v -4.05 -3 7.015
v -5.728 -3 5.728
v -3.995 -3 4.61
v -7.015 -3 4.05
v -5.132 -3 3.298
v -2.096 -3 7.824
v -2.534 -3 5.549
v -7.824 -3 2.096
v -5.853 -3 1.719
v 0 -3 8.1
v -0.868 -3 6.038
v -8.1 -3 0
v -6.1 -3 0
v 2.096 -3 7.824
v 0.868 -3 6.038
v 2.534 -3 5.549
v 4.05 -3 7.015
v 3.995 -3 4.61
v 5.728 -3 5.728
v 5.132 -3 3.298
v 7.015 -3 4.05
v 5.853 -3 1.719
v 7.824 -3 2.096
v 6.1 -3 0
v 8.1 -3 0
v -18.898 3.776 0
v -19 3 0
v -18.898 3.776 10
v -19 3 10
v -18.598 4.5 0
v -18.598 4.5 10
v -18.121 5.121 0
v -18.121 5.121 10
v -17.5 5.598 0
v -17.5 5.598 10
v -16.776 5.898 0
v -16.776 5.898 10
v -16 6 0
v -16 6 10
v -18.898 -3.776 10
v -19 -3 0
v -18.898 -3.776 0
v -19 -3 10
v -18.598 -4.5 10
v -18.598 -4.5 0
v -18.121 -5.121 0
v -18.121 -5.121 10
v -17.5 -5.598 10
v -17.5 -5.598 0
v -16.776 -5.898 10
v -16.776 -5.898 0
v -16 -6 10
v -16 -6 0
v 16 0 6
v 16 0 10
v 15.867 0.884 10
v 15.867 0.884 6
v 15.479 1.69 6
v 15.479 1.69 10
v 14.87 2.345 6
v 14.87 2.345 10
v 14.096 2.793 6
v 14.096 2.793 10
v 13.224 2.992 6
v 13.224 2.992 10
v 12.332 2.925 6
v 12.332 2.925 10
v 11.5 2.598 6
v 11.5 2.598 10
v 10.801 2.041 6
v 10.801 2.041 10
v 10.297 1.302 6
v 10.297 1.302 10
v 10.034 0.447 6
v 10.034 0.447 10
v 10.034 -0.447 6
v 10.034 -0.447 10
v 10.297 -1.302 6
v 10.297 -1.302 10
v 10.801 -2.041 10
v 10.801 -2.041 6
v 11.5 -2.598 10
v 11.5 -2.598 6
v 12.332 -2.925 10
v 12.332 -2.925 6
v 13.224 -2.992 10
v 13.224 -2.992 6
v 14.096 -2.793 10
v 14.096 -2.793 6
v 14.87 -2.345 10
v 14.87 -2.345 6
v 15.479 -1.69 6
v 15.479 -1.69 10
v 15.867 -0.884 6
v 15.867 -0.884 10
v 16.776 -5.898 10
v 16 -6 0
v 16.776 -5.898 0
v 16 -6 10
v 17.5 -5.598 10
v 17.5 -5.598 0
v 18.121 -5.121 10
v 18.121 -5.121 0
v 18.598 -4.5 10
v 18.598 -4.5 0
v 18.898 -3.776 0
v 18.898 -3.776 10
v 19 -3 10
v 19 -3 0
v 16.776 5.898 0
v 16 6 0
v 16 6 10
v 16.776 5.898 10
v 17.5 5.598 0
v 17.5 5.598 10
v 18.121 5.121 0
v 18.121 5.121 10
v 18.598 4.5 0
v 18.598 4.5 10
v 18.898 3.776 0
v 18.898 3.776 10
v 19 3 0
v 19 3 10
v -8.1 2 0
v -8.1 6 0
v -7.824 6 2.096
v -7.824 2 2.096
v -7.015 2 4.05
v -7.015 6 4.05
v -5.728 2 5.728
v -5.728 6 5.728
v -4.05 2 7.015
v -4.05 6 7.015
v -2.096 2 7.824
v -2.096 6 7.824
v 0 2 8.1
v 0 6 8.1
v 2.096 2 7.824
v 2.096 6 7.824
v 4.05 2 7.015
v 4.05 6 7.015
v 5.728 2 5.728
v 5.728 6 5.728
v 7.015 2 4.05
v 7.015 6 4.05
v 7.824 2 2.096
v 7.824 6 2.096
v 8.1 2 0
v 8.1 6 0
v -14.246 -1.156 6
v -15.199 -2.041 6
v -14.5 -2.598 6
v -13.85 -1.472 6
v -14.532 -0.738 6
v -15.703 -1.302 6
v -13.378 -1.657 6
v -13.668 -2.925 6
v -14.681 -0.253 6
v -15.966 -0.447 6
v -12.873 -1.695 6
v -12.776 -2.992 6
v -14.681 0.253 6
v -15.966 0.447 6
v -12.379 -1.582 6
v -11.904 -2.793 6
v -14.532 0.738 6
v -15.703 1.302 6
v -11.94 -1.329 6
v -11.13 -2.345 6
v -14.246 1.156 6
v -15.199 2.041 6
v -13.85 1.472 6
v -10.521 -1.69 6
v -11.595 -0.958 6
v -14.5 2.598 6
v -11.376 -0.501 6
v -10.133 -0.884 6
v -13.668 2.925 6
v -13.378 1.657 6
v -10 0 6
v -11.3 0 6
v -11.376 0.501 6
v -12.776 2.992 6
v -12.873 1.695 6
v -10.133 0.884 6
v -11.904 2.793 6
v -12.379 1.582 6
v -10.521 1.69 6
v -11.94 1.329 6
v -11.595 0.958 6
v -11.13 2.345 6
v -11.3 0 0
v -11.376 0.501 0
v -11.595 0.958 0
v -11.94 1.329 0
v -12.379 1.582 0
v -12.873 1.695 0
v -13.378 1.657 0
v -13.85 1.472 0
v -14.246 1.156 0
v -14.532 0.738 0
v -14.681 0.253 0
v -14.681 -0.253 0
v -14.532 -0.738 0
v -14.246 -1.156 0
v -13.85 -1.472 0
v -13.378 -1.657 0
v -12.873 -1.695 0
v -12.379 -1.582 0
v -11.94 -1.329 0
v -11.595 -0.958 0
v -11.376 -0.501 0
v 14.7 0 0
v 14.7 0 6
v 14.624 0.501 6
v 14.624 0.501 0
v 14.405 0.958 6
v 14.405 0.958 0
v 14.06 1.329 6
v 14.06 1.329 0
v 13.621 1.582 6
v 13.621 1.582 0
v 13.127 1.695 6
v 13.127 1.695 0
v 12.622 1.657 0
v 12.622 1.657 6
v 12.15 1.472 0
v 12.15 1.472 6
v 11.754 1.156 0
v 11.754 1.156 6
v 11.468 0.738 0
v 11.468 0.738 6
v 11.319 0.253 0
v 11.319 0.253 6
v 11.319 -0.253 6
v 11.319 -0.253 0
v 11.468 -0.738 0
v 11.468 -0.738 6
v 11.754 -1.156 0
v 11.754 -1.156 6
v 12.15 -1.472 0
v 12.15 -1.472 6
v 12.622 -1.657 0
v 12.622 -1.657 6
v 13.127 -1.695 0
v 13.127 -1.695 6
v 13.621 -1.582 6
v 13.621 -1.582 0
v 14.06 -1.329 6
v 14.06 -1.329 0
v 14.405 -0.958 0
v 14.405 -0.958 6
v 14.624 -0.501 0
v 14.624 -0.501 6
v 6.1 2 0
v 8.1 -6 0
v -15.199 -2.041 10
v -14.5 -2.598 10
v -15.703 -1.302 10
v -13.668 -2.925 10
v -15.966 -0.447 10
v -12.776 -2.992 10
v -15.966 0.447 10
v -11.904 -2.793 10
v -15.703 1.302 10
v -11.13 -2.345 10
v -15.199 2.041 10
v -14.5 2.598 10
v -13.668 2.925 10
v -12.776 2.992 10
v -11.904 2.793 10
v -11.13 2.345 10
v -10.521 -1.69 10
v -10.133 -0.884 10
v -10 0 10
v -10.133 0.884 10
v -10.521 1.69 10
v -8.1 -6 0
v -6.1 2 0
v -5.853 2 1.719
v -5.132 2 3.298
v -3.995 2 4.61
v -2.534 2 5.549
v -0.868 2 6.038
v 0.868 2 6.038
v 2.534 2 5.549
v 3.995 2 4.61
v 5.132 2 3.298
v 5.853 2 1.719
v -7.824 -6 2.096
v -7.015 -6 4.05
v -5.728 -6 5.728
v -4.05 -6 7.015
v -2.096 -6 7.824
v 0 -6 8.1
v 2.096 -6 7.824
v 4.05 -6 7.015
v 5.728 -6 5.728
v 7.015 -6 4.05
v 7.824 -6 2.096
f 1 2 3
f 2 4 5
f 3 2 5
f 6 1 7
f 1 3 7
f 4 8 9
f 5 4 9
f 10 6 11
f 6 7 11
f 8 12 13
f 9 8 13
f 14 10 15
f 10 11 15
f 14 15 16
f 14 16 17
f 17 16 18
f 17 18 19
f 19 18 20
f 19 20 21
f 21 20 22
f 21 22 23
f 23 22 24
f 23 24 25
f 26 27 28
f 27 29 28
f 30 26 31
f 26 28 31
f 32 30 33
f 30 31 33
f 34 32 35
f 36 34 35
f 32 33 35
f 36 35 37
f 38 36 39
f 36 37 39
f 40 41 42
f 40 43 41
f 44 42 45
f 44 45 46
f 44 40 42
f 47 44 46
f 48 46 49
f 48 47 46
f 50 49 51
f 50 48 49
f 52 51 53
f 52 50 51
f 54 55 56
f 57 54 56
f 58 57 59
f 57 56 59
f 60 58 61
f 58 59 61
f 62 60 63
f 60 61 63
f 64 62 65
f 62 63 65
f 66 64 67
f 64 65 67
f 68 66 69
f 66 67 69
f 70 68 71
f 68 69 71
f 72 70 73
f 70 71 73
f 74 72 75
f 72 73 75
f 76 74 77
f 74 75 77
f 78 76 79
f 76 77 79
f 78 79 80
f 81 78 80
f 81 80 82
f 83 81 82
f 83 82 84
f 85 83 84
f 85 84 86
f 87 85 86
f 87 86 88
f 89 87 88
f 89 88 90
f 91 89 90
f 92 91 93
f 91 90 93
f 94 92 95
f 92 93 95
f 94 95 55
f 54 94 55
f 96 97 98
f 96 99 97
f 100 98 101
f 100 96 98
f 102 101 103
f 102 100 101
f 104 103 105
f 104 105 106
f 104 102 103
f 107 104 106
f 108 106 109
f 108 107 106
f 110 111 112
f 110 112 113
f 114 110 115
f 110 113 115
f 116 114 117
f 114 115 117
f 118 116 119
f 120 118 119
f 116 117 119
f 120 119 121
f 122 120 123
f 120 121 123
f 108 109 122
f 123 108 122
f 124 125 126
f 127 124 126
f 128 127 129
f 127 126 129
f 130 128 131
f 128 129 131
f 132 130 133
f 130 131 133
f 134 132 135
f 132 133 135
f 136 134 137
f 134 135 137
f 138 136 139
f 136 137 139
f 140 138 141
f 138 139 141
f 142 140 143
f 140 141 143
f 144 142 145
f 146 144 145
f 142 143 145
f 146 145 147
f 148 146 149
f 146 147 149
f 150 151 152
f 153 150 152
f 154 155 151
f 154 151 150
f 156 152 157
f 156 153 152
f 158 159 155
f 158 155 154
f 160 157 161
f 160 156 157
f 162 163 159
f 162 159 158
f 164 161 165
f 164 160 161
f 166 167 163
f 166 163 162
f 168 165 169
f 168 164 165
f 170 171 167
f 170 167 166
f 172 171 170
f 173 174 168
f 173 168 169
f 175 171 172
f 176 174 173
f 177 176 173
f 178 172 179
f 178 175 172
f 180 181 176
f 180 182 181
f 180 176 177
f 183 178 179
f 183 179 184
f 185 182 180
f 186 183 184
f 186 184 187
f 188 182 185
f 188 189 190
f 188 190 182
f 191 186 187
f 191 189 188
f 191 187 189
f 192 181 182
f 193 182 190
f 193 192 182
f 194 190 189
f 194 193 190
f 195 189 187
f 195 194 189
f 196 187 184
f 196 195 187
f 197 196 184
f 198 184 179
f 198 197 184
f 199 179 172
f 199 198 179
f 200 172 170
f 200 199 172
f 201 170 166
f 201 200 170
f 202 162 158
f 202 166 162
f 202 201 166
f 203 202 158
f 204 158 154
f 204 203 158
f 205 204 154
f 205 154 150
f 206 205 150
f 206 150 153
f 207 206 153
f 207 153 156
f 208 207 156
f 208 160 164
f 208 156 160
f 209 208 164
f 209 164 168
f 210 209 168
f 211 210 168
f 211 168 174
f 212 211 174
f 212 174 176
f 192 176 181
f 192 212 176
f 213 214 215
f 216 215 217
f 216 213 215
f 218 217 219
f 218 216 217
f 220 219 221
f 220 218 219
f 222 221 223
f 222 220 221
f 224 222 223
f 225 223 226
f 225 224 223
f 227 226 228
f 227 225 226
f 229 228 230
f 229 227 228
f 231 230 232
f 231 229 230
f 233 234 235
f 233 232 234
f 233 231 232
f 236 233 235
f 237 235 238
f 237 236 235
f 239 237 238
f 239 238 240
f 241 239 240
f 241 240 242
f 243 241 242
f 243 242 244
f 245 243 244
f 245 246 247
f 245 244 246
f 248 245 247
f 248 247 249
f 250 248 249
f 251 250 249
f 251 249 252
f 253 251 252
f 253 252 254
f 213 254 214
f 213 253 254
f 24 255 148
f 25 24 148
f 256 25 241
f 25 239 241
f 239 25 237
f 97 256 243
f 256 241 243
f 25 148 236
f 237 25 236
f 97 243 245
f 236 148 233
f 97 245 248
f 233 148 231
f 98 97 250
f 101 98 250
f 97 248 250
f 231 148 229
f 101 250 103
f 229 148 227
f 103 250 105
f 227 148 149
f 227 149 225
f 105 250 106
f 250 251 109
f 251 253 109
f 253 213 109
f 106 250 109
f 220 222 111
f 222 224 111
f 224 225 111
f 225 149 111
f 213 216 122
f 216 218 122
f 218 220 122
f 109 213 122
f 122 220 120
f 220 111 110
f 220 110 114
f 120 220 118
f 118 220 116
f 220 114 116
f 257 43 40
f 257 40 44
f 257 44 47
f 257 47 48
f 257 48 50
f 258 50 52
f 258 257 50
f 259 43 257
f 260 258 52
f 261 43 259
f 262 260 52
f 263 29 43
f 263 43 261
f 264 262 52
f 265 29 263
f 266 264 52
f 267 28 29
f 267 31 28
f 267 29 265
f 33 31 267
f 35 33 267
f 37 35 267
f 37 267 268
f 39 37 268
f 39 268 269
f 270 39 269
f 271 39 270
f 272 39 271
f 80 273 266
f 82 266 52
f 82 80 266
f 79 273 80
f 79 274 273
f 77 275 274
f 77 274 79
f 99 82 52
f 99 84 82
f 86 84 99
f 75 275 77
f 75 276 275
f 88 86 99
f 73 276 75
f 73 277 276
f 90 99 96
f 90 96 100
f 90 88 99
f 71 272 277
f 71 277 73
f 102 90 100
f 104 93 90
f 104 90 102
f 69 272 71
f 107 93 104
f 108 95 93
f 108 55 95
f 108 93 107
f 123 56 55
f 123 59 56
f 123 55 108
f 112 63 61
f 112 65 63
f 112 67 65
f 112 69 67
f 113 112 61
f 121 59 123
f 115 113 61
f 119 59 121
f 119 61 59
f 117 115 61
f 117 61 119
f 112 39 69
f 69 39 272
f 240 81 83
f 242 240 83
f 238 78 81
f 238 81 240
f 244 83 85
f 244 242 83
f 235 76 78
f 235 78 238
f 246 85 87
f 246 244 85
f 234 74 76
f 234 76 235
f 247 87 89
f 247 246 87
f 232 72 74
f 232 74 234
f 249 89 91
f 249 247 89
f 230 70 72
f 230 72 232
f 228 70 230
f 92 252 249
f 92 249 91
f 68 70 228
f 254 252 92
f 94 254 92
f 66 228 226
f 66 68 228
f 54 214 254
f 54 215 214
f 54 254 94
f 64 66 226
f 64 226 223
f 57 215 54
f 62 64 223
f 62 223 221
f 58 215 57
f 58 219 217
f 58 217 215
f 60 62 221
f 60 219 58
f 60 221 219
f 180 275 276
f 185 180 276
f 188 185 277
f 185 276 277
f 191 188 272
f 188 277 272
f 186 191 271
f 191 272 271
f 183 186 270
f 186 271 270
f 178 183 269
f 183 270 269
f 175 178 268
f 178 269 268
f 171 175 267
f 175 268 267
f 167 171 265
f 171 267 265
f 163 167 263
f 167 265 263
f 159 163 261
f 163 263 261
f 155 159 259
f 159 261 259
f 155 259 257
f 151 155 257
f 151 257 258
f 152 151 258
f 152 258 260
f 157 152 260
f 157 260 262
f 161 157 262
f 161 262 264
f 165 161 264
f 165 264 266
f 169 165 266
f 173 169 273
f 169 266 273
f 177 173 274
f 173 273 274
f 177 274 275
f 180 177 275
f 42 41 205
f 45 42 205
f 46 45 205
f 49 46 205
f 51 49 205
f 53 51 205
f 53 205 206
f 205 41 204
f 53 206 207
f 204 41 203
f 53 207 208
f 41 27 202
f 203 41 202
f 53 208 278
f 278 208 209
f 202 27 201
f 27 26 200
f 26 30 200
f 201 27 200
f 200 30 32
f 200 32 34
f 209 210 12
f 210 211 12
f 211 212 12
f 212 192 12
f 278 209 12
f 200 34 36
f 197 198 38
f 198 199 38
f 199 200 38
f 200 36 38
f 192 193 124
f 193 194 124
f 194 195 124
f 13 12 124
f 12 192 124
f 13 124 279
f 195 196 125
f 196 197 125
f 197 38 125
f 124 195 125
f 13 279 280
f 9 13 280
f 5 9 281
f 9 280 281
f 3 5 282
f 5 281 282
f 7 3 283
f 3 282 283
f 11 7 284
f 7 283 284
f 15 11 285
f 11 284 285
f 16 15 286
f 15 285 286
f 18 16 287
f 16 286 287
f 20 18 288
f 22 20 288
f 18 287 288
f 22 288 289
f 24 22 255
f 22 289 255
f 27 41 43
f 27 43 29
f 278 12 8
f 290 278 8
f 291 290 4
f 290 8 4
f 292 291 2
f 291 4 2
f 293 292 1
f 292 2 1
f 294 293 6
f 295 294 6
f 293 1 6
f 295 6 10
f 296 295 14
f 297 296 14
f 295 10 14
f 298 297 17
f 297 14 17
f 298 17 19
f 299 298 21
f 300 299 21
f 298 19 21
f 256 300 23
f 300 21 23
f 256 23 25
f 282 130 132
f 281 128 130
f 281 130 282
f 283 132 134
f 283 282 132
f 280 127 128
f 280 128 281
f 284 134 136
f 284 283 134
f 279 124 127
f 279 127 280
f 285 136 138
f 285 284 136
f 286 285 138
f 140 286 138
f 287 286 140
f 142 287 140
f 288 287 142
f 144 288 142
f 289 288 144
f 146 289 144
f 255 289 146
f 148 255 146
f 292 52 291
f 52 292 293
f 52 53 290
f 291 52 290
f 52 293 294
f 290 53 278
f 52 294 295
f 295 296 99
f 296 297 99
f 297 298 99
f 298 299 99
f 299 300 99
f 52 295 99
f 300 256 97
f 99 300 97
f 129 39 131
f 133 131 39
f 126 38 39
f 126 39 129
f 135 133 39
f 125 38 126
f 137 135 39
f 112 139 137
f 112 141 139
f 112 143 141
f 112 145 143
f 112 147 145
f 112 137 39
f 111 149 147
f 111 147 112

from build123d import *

# Parameters (mm, degrees)
ESBO_O1_W                = 38
ESBO_O1_H                = 12
ESBO_O1_R                = 1.7
RESSALTO_EXTRUS_O1_DEPTH = 10
FILETE1_R                = 3
ESBO_O2_R                = 8.1
CORTE_EXTRUS_O1_DEPTH    = 4
ESBO_O3_R                = 6.1
CORTE_EXTRUS_O2_DEPTH    = 5
CORTE_EXTRUS_O3_START    = -9
ESBO_O2_2_R              = 8.1
CORTE_EXTRUS_O3_DEPTH    = 4
ESBO_O4_R                = 3
CORTE_EXTRUS_O4_DEPTH    = 4


with BuildPart() as part:
    # Esboço1 → Ressalto-extrusão1 (new body)
    with BuildSketch(Plane.XY):
        Rectangle(ESBO_O1_W, ESBO_O1_H)
        with Locations((13, 0)):
            Circle(ESBO_O1_R, mode=Mode.SUBTRACT)
        with Locations((-13, 0)):
            Circle(ESBO_O1_R, mode=Mode.SUBTRACT)
    extrude(amount=RESSALTO_EXTRUS_O1_DEPTH)

    # Filete1
    filete1_edges = [part.edges().sort_by_distance(p)[0] for p in [
        (-19, -6, 5),
        (-19, 6, 5),
        (19, 6, 5),
        (19, -6, 5),
    ]]
    fillet(filete1_edges, radius=FILETE1_R)

    # Esboço2 → Corte-extrusão1 (cut)
    with BuildSketch(Plane(origin=(0, 6, 0), x_dir=(1, 0, 0), z_dir=(0, 1, 0))):
        Circle(ESBO_O2_R)
    extrude(amount=-CORTE_EXTRUS_O1_DEPTH, mode=Mode.SUBTRACT)

    # Esboço3 → Corte-extrusão2 (cut)
    with BuildSketch(Plane(origin=(0, 2, 0), x_dir=(1, 0, 0), z_dir=(0, 1, 0))):
        Circle(ESBO_O3_R)
    extrude(amount=-CORTE_EXTRUS_O2_DEPTH, mode=Mode.SUBTRACT)

    # Esboço2<2> → Corte-extrusão3 (cut)
    with BuildSketch(Plane(origin=(0, 6, 0), x_dir=(1, 0, 0), z_dir=(0, 1, 0)).offset(CORTE_EXTRUS_O3_START)):
        Circle(ESBO_O2_2_R)
    extrude(amount=-CORTE_EXTRUS_O3_DEPTH, mode=Mode.SUBTRACT)

    # Esboço4 → Corte-extrusão4 (cut)
    with BuildSketch(Plane.XY.offset(10)):
        with Locations((-13, 0)):
            Circle(ESBO_O4_R)
        with Locations((13, 0)):
            Circle(ESBO_O4_R)
    extrude(amount=-CORTE_EXTRUS_O4_DEPTH, mode=Mode.SUBTRACT)


solid = part.part
